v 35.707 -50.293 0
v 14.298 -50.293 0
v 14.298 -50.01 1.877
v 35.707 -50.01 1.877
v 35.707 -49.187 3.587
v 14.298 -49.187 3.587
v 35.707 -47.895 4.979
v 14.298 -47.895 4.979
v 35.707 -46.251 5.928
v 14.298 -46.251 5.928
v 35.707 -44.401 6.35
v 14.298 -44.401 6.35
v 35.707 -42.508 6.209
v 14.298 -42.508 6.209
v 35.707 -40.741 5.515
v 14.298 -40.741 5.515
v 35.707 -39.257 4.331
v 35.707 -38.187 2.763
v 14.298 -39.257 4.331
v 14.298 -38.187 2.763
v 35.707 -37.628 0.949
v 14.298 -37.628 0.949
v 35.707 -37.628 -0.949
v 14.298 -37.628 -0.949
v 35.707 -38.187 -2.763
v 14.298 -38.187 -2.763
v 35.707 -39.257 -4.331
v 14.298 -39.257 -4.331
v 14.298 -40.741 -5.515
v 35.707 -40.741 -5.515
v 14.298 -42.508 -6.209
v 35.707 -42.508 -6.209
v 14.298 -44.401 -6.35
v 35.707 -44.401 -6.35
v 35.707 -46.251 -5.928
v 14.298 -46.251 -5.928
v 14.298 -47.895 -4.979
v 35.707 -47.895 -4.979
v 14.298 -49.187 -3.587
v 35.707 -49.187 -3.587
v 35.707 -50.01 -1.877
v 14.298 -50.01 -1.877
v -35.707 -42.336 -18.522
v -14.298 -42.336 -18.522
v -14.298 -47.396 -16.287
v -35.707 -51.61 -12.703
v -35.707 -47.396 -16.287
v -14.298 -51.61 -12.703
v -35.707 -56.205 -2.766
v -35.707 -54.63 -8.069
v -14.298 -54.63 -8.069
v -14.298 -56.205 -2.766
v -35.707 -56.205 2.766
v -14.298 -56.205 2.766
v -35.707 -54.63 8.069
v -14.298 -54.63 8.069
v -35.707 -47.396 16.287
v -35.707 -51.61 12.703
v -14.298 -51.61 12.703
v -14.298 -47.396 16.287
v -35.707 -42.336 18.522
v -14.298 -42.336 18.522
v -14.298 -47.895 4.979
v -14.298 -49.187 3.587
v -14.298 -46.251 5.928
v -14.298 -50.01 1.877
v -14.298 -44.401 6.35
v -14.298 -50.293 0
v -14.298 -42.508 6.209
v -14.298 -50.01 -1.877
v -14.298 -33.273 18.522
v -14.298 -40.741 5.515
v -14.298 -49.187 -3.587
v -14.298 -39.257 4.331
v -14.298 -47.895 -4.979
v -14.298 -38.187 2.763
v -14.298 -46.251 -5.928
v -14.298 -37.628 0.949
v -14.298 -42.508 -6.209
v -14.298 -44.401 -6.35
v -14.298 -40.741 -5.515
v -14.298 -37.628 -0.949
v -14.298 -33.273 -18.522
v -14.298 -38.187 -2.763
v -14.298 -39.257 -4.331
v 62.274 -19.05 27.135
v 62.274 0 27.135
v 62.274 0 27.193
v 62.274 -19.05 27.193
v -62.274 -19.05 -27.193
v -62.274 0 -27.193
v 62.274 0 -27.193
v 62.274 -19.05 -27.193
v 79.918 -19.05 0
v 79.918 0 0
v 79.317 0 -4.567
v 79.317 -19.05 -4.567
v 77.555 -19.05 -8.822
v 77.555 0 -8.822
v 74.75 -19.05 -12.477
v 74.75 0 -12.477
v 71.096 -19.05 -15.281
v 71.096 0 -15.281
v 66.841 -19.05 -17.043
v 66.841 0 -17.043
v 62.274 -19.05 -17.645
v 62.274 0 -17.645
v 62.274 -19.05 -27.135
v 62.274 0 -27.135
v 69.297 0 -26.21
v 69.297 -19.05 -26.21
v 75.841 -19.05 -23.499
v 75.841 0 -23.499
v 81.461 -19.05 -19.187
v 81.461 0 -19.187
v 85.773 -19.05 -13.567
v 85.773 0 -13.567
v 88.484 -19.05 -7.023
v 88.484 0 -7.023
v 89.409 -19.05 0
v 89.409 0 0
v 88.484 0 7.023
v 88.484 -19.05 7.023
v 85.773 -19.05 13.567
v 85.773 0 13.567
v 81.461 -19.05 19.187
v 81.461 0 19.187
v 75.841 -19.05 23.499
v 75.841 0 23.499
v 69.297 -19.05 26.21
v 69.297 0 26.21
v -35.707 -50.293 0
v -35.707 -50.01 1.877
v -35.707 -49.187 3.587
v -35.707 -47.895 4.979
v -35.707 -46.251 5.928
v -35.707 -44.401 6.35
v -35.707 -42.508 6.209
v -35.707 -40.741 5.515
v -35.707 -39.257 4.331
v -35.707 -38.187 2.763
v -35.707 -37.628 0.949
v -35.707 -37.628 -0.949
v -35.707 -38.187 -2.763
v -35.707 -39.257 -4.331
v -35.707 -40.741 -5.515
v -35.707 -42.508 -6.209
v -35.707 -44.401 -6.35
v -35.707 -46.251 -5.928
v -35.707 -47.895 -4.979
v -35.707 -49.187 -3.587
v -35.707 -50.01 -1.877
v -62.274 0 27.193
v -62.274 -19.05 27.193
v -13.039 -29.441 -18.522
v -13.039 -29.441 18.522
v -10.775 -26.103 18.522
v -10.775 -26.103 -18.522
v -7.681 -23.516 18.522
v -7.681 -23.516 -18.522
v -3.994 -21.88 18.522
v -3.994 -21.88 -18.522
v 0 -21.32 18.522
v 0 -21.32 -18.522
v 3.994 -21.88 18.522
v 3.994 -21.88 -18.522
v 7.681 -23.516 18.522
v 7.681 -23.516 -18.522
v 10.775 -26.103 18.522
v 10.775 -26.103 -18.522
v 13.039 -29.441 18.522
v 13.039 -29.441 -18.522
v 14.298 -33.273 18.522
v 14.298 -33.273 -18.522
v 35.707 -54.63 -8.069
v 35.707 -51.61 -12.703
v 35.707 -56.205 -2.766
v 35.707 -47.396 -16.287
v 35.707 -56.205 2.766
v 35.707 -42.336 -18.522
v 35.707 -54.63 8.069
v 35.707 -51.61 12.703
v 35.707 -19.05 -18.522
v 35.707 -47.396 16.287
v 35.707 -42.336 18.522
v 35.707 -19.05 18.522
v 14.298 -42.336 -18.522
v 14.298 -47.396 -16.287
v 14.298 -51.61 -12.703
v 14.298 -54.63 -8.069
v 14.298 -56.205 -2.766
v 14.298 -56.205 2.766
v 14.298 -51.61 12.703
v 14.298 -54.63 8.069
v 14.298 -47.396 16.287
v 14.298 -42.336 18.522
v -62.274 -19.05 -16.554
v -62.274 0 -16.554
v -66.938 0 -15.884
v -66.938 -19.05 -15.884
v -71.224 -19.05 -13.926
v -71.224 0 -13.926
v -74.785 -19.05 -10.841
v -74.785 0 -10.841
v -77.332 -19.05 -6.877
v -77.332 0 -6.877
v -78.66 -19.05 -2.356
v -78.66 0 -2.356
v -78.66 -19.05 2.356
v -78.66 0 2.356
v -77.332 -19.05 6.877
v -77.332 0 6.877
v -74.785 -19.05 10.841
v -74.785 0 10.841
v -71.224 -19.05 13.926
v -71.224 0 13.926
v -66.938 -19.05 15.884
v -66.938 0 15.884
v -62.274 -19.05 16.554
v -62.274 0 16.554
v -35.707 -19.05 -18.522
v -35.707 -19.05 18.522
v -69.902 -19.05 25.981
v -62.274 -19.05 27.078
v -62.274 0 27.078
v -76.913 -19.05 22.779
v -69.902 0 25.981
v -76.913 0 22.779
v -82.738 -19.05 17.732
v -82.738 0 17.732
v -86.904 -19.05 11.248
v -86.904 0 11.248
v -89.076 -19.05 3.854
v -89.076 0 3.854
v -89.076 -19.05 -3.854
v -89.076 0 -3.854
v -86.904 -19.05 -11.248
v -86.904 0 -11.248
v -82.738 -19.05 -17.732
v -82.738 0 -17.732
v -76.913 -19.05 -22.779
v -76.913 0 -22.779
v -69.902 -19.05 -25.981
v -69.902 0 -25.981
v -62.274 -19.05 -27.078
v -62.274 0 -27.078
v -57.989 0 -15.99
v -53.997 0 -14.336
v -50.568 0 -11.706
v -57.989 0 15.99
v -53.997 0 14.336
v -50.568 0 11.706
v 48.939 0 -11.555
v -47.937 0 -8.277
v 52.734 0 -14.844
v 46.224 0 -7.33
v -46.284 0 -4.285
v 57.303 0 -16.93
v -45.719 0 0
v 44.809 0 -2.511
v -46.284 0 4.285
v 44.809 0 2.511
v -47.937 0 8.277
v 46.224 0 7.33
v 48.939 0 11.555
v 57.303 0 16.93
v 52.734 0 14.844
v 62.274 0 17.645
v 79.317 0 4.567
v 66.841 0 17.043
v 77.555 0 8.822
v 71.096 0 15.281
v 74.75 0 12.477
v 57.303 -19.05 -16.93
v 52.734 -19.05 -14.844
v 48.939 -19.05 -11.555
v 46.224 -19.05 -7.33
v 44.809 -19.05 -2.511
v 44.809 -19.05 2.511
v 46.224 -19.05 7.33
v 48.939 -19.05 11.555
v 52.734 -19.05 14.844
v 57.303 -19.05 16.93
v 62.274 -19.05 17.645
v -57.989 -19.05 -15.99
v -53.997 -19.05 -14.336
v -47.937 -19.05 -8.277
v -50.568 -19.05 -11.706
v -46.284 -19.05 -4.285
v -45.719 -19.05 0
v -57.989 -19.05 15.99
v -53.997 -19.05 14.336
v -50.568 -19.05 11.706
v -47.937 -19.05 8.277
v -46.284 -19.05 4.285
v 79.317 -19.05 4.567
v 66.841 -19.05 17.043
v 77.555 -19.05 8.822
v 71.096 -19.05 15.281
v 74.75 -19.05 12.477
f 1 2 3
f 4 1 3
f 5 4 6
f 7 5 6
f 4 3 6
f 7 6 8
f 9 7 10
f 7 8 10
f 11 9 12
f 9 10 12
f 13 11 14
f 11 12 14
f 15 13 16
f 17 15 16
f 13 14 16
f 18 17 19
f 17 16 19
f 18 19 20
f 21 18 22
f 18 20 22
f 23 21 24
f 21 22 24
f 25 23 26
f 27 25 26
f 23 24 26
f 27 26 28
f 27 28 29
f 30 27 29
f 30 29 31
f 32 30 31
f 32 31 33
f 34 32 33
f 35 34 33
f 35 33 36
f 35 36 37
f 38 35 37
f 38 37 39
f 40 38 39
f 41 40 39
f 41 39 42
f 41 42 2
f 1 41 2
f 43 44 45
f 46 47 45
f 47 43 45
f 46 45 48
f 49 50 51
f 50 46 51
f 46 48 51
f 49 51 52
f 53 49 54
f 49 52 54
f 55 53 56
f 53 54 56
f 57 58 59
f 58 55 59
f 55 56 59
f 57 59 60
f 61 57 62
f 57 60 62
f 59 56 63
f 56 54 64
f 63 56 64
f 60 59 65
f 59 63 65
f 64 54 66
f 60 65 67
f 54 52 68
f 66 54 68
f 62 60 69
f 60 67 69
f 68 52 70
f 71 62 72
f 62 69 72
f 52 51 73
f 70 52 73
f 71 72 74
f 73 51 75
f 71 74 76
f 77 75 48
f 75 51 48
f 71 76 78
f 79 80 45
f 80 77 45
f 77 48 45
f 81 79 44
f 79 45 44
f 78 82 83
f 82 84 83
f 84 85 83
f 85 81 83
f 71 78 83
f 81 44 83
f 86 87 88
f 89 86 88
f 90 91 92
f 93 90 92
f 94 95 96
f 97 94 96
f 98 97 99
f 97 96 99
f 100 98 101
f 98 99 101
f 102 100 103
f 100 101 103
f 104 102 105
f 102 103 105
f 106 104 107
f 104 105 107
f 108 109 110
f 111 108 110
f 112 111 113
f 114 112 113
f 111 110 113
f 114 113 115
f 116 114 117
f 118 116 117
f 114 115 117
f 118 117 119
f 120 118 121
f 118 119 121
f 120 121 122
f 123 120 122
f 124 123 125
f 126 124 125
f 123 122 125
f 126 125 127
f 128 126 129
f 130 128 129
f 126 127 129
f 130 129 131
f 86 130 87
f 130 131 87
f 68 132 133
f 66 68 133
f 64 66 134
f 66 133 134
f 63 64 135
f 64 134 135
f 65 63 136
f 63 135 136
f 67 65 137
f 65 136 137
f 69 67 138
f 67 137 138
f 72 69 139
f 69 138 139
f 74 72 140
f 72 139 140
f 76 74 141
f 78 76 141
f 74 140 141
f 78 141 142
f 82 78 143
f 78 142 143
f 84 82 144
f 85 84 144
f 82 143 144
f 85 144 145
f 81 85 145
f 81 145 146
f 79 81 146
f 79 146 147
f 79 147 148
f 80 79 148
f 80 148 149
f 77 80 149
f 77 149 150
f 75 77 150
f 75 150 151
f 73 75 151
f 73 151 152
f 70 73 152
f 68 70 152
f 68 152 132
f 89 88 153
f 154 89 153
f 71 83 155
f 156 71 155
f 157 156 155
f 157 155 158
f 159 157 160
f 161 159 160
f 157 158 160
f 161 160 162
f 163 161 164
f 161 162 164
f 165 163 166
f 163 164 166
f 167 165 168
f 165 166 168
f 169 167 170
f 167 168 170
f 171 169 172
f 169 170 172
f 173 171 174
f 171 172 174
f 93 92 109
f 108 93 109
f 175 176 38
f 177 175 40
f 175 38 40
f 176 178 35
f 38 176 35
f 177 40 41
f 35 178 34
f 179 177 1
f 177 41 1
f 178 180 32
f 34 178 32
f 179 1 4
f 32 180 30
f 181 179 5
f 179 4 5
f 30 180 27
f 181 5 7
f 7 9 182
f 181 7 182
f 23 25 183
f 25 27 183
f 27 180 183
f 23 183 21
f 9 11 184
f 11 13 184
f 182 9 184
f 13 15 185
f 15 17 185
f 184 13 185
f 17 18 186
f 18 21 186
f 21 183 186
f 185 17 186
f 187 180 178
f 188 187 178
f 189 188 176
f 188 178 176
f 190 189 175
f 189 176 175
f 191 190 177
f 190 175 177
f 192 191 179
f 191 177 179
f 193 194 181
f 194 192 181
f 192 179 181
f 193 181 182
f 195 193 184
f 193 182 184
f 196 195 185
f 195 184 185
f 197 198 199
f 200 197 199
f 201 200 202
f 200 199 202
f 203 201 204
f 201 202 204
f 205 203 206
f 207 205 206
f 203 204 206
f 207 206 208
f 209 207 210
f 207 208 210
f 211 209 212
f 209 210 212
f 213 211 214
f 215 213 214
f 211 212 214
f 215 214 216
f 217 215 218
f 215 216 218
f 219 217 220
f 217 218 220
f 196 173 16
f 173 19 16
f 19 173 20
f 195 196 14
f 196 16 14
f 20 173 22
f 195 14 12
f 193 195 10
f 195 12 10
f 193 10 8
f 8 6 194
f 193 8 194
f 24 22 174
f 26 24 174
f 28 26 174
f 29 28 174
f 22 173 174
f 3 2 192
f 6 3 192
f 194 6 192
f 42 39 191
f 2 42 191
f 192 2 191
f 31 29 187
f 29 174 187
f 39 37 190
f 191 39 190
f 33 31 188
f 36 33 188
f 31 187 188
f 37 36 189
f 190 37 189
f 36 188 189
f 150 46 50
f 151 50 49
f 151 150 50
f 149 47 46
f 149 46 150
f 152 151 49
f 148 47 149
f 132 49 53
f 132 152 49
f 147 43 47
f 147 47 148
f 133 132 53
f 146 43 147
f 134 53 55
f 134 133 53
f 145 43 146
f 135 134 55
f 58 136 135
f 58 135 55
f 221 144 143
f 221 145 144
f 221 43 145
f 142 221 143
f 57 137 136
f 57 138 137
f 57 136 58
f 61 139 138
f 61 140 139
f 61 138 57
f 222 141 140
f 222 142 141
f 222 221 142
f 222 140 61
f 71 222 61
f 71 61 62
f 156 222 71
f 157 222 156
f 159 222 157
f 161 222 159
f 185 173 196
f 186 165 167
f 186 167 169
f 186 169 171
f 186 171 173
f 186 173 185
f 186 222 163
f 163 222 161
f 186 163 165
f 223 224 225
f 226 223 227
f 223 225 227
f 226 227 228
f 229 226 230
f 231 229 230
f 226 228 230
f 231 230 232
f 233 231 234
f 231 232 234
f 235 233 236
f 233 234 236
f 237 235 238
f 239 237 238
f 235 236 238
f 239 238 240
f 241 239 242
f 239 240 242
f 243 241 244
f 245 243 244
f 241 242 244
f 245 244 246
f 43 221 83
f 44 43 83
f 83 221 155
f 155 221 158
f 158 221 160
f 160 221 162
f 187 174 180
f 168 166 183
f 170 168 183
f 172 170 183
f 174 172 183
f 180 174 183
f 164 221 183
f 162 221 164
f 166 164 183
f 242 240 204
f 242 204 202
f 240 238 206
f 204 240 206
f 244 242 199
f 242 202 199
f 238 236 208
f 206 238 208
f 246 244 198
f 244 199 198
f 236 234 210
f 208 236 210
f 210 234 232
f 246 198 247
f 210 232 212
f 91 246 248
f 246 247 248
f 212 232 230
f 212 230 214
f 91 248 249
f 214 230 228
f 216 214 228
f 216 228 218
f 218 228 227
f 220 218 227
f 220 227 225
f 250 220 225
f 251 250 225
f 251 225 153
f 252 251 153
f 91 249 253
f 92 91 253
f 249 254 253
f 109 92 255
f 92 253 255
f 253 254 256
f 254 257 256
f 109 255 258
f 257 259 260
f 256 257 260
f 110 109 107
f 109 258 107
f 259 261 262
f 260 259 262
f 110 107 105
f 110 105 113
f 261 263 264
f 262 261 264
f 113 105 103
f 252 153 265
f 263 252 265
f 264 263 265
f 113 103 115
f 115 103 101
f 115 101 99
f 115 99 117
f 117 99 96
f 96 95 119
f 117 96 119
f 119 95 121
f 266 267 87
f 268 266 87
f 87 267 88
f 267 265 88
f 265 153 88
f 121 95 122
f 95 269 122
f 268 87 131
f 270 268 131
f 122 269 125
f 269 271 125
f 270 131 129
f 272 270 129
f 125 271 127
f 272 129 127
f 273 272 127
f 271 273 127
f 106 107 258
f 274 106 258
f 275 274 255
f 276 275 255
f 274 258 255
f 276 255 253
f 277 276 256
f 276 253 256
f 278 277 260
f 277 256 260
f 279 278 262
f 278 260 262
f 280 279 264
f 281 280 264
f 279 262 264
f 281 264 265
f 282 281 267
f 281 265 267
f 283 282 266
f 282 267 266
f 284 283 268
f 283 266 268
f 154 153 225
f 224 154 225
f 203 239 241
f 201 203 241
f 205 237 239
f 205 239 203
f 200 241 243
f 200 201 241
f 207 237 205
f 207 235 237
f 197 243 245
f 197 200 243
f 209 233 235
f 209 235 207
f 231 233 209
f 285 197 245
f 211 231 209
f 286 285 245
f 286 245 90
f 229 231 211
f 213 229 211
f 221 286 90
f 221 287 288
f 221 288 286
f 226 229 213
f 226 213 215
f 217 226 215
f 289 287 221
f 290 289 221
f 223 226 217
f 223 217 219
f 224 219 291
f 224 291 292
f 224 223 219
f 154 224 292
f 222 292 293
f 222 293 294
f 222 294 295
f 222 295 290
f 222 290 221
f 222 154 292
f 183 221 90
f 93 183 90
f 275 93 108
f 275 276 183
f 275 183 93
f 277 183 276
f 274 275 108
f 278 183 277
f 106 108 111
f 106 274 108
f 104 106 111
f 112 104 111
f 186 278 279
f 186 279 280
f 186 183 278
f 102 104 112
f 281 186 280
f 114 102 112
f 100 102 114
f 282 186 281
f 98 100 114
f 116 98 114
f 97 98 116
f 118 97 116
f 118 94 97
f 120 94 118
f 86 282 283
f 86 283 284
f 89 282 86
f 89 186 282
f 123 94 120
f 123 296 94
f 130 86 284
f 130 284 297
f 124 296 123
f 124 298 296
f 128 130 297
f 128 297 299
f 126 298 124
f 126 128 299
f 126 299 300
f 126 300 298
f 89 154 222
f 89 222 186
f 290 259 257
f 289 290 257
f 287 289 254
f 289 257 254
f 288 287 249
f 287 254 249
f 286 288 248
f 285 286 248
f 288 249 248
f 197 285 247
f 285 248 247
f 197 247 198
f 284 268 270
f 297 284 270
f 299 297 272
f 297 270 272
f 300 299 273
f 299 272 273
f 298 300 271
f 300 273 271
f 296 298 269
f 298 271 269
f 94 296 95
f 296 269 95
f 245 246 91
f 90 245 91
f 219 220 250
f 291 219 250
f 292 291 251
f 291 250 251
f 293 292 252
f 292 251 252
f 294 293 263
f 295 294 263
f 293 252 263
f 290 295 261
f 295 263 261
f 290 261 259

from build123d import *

# Parameters (mm, degrees)
F1_DEPTH = 19.05
F2_W     = 71.4131370187
F2_H     = 37.0434857905
F3_DEPTH = 38.1
F5_DEPTH = 125.0588758598
F6_W     = 28.5964906216
F6_H     = 18.30278337
F6_H_2   = 9.0631097555
F7_DEPTH = 45.7155236433
F8_R     = 6.3682145367
F9_DEPTH = 125.1160786257


with BuildPart() as f1:
    # F0 (on Front) → F1 (new body)
    with BuildSketch(Plane.XZ):
        with BuildLine():
            Line((62.2737929225, 27.192780748), (-62.2737929225, 27.192780748))
            Line((-62.2737929225, 27.192780748), (-62.2737929225, 27.077514428))
            ThreePointArc((-62.2737929225, 27.077514428), (-43.1270988528, 19.1466940697), (-35.1962784945, 0))
            ThreePointArc((-35.1962784945, 0), (-43.1270988528, -19.1466940697), (-62.2737929225, -27.077514428))
            Line((-62.2737929225, -27.077514428), (-62.2737929225, -27.192780748))
            Line((-62.2737929225, -27.192780748), (62.2737929225, -27.192780748))
            Line((62.2737929225, -27.192780748), (62.2737929225, -27.1347171939))
            ThreePointArc((62.2737929225, -27.1347171939), (35.1390757286, 0), (62.2737929225, 27.1347171939))
            Line((62.2737929225, 27.1347171939), (62.2737929225, 27.192780748))
        make_face()
        with BuildLine():
            ThreePointArc((-35.1962784945, 0), (-43.1270988528, 19.1466940697), (-62.2737929225, 27.077514428))
            Line((-62.2737929225, 27.077514428), (-62.2737929225, 16.5543363838))
            ThreePointArc((-62.2737929225, 16.5543363838), (-50.5681094075, 11.705683515), (-45.7194565387, 0))
            ThreePointArc((-45.7194565387, 0), (-50.5681094075, -11.705683515), (-62.2737929225, -16.5543363838))
            Line((-62.2737929225, -16.5543363838), (-62.2737929225, -27.077514428))
            ThreePointArc((-62.2737929225, -27.077514428), (-43.1270988528, -19.1466940697), (-35.1962784945, 0))
        make_face()
        with BuildLine():
            Line((-62.2737929225, 16.5543363838), (-62.2737929225, 27.077514428))
            ThreePointArc((-62.2737929225, 27.077514428), (-89.3513073505, 0), (-62.2737929225, -27.077514428))
            Line((-62.2737929225, -27.077514428), (-62.2737929225, -16.5543363838))
            ThreePointArc((-62.2737929225, -16.5543363838), (-78.8281293062, 0), (-62.2737929225, 16.5543363838))
        make_face()
        with BuildLine():
            Line((62.2737929225, 17.6446747149), (62.2737929225, 27.1347171939))
            ThreePointArc((62.2737929225, 27.1347171939), (35.1390757286, 0), (62.2737929225, -27.1347171939))
            Line((62.2737929225, -27.1347171939), (62.2737929225, -17.6446747149))
            ThreePointArc((62.2737929225, -17.6446747149), (44.6291182076, 0), (62.2737929225, 17.6446747149))
        make_face()
        with BuildLine():
            ThreePointArc((89.4085101164, 0), (81.4609354559, 19.1871425334), (62.2737929225, 27.1347171939))
            Line((62.2737929225, 27.1347171939), (62.2737929225, 17.6446747149))
            ThreePointArc((62.2737929225, 17.6446747149), (74.7504620652, 12.4766691427), (79.9184676374, 0))
            ThreePointArc((79.9184676374, 0), (74.7504620652, -12.4766691427), (62.2737929225, -17.6446747149))
            Line((62.2737929225, -17.6446747149), (62.2737929225, -27.1347171939))
            ThreePointArc((62.2737929225, -27.1347171939), (81.4609354559, -19.1871425334), (89.4085101164, 0))
        make_face()
    extrude(amount=F1_DEPTH)

    # F2 (on face) → F3 (join)
    with BuildSketch(Plane.XZ.offset(19.05)):
        Rectangle(F2_W, F2_H)
    extrude(amount=F3_DEPTH)

    # F4 (on face) → F5 (cut, through all)
    with BuildSketch(Plane.YZ.offset(35.7065685093)):
        with BuildLine():
            ThreePointArc((-42.3361994326, -18.5217428952), (-56.4047103889, 0), (-42.3361994326, 18.5217428952))
            Line((-42.3361994326, 18.5217428952), (-57.15, 18.5217428952))
            Line((-57.15, 18.5217428952), (-57.15, -18.5217428952))
            Line((-57.15, -18.5217428952), (-42.3361994326, -18.5217428952))
        make_face()
    extrude(amount=-F5_DEPTH, mode=Mode.SUBTRACT)

    # F6 (on face) → F7 (cut, through all)
    with BuildSketch(Plane(origin=(0, 0, -18.5217428952), x_dir=(1, 0, 0), z_dir=(0, 0, -1))):
        with Locations((0, 51.4875911176)):
            Rectangle(F6_W, F6_H)
        with Locations((0, 37.8046445549)):
            Rectangle(F6_W, F6_H_2)
        with BuildLine():
            Line((14.2982453108, 33.2730896771), (-14.2982453108, 33.2730896771))
            ThreePointArc((-14.2982453108, 33.2730896771), (0, 21.3200343577), (14.2982453108, 33.2730896771))
        make_face()
    extrude(amount=-F7_DEPTH, mode=Mode.SUBTRACT)

    # F8 (on face) → F9 (cut, through all)
    with BuildSketch(Plane(origin=(-35.7065685093, 0, 0), x_dir=(0, -1, 0), z_dir=(-1, 0, 0))):
        with Locations((43.9249239862, 0)):
            Circle(F8_R)
    extrude(amount=-F9_DEPTH, mode=Mode.SUBTRACT)


solid = f1.part
